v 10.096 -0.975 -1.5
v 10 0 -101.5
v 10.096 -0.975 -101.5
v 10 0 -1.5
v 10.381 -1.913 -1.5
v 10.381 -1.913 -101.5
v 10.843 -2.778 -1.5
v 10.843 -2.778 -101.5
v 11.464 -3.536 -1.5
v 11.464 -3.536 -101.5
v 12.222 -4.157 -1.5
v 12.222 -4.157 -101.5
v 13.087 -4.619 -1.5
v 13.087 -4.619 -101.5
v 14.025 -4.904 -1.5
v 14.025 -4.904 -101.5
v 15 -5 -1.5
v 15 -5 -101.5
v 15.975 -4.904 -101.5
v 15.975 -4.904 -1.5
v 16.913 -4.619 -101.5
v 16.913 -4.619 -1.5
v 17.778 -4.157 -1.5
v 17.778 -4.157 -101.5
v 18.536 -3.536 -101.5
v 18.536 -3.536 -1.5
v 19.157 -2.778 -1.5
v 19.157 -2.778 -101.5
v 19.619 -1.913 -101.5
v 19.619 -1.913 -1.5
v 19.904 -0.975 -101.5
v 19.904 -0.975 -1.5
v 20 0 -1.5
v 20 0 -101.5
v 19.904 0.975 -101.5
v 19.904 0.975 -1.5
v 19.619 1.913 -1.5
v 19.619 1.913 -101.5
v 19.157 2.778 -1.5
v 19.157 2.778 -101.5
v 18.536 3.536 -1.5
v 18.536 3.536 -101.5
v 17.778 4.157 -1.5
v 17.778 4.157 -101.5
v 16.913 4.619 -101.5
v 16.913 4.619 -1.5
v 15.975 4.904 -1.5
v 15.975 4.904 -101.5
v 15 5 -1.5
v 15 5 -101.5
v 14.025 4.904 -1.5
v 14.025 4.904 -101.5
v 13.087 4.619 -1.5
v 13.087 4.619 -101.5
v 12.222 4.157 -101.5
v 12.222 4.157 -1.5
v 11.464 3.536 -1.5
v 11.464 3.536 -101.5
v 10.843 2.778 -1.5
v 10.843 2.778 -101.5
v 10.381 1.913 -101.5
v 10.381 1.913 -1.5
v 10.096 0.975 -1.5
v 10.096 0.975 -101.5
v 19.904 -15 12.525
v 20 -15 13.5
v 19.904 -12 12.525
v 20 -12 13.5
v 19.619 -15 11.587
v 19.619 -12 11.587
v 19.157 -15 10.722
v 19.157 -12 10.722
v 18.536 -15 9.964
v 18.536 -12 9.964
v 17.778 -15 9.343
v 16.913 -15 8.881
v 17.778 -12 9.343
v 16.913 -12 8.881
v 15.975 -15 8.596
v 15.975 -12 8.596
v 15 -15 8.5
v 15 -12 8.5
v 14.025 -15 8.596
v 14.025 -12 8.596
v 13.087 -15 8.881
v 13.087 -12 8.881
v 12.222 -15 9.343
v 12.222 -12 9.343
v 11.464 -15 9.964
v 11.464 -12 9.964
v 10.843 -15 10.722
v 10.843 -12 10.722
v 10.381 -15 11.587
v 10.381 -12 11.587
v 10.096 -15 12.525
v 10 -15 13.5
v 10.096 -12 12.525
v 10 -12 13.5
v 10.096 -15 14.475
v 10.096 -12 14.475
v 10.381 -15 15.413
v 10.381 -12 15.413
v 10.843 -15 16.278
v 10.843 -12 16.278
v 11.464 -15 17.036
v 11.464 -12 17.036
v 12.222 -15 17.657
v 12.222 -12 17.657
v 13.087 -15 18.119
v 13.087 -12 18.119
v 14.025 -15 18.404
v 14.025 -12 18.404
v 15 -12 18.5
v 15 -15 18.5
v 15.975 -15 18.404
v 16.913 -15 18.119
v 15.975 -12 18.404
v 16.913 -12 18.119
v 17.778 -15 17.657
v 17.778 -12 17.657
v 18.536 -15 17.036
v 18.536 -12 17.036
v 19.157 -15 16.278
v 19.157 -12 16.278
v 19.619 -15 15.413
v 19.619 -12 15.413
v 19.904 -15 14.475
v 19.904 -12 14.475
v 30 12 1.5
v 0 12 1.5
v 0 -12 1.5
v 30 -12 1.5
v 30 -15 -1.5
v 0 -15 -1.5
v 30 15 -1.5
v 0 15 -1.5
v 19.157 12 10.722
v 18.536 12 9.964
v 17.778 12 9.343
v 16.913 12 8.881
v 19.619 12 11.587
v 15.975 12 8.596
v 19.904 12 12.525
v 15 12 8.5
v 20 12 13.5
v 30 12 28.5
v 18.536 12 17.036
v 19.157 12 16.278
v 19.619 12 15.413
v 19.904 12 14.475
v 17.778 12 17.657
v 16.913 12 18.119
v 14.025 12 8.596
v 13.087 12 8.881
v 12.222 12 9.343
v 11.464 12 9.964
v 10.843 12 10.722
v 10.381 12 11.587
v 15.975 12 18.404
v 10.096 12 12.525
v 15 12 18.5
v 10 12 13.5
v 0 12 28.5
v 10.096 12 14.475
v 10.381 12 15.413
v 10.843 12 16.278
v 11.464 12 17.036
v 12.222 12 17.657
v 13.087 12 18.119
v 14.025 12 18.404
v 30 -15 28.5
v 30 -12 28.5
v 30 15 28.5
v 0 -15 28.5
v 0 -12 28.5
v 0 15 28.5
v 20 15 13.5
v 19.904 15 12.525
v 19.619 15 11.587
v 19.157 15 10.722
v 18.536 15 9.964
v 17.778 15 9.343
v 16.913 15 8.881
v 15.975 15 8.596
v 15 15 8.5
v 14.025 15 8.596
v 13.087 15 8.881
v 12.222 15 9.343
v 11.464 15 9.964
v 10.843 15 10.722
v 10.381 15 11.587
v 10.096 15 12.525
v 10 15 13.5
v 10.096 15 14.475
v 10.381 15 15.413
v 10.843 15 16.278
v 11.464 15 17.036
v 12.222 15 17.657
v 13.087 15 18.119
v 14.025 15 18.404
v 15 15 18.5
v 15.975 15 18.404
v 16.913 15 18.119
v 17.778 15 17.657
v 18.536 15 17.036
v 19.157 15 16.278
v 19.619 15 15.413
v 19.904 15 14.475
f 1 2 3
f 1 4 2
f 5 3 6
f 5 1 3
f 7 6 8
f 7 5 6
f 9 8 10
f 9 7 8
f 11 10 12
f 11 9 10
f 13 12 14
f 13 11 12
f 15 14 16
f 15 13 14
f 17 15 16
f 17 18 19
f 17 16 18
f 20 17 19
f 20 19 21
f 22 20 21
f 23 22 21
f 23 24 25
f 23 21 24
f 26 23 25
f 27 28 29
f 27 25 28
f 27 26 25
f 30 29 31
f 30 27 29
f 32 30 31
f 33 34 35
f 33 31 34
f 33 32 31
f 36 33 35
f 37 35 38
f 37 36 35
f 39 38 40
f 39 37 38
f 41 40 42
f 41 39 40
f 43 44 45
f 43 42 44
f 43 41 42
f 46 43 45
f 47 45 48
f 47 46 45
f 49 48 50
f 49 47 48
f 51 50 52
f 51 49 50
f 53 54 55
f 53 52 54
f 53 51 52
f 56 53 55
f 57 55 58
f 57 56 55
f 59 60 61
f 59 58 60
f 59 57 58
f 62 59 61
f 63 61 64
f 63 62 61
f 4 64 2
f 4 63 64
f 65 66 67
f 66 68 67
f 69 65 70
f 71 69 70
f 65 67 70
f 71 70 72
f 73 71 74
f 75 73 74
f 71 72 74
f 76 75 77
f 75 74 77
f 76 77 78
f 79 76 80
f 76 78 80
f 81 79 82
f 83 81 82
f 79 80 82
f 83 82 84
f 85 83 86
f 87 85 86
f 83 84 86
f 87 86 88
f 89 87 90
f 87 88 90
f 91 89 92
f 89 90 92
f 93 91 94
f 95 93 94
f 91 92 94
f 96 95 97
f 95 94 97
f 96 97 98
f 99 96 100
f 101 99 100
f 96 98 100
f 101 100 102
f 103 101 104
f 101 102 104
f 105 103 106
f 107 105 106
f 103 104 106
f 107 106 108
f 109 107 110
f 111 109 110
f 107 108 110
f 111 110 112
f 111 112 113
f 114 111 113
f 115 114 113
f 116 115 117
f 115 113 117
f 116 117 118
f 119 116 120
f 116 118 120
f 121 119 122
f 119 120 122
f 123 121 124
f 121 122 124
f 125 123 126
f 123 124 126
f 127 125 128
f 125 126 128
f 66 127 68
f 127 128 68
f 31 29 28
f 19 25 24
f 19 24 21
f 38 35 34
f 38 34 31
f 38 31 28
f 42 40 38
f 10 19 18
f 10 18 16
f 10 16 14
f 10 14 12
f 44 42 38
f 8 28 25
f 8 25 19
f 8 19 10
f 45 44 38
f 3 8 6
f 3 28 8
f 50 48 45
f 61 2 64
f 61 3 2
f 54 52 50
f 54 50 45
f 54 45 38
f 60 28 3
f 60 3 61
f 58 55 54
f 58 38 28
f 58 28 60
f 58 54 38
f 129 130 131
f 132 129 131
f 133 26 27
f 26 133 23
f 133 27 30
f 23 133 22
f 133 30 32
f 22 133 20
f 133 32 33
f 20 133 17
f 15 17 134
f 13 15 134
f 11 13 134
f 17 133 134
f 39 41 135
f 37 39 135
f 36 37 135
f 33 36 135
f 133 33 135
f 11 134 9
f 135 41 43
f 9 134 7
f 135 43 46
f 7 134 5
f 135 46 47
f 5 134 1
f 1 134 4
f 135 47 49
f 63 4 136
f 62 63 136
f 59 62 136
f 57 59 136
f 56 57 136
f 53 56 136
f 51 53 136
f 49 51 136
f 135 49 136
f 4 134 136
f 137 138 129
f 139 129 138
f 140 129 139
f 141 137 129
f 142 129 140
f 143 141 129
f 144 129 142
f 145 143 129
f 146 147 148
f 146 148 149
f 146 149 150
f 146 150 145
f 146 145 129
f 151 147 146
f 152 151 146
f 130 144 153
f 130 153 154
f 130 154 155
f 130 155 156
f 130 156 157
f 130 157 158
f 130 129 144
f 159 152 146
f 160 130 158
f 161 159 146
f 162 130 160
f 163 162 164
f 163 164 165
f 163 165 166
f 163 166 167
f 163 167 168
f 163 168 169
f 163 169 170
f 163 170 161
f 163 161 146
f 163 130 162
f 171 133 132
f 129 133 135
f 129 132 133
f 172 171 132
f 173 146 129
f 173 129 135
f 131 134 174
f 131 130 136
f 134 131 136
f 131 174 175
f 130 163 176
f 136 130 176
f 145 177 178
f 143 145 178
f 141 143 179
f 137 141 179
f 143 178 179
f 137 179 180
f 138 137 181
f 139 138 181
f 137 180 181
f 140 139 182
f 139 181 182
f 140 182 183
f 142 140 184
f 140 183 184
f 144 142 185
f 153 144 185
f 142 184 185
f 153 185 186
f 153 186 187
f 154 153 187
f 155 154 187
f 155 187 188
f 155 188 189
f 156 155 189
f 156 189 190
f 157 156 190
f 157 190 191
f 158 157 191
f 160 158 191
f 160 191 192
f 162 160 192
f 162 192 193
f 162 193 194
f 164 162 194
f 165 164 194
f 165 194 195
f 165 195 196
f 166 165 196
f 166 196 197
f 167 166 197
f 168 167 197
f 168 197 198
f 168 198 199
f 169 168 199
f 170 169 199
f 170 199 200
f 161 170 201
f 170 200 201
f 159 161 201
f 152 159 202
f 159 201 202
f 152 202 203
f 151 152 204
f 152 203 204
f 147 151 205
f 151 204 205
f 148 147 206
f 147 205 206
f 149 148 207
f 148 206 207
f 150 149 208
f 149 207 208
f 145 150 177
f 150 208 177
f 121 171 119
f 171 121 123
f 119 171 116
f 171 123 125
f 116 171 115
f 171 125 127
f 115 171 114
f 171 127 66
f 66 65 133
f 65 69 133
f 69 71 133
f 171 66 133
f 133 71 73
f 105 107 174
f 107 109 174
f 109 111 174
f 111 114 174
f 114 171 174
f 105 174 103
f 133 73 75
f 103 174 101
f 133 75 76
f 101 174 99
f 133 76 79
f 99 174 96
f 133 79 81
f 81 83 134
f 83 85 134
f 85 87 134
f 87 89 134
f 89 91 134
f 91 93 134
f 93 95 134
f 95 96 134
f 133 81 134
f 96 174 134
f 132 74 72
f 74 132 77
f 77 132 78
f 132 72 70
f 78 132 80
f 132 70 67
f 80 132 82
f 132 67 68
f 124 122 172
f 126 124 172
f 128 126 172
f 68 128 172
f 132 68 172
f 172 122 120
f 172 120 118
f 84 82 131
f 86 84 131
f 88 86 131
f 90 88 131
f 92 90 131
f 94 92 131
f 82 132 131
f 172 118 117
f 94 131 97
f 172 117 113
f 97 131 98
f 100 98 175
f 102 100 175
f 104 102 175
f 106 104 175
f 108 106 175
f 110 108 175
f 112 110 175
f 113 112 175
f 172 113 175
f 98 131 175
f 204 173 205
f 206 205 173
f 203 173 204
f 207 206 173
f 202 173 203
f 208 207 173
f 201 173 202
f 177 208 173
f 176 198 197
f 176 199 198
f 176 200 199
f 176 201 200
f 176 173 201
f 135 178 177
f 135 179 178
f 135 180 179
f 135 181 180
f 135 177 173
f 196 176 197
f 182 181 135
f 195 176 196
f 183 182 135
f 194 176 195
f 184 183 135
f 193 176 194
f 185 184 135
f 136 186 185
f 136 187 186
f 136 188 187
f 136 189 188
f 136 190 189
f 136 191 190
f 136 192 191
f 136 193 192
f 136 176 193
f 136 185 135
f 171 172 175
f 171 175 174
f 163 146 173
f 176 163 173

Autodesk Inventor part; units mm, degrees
ref_plane "YZ Plane" through (0, 0, 0) normal (1, 0, 0) x (0, 1, 0)
ref_plane "XZ Plane" through (0, 0, 0) normal (0, 1, 0) x (-1, 0, 0)
ref_plane "XY Plane" through (0, 0, 0) normal (0, 0, 1) x (1, 0, 0)
sketch "Sketch1" plane through (0, 0, 0) normal (1, 0, 0) x (0, 1, 0)
  line L0 (12, 1.5) -> (-12, 1.5)
  line L1 (-15, 1.5) -> (-15, -1.5)
  line L2 (-15, -1.5) -> (15, -1.5)
  line L3 (15, -1.5) -> (15, 1.5)
  line L4 (15, 1.5) -> (-15, -1.5) construction
  line L5 (-15, 1.5) -> (15, -1.5) construction
  line L6 (15, -1.5) -> (12, -1.5)
  line L7 (12, 28.5) -> (15, 28.5)
  line L8 (15, 28.5) -> (15, -1.5)
  line L9 (-15, -1.5) -> (-12, -1.5)
  line L10 (-12, 28.5) -> (-15, 28.5)
  line L11 (-15, 28.5) -> (-15, -1.5)
  line L12 (12, -1.5) -> (12, -1.2)
  line L13 (12, 1.2) -> (12, 28.5)
  line L14 (-12, -1.5) -> (-12, -1.2)
  line L15 (-12, 1.2) -> (-12, 28.5)
  point P0 (0, 0)
  dimension "d0" = 30
  dimension "d1" = 3
  dimension "d2" = 3
  dimension "d3" = 30
  dimension "d4" = 3
  dimension "d5" = 30
extrude "Extrusion1" add sketch "Sketch1" along normal blind 30
sketch "Sketch2" plane through (0, 15, 28.5) normal (0, 1, 0) x (1, 0, 0)
  line L0 (0, 30) -> (30, 30) construction
  line L1 (0, 0) -> (30, 30) construction
  circle A0 centre (15, 15) radius 5
  point P0 (0, 28.5)
  dimension "d8" = 10
extrude "Extrusion2" cut sketch "Sketch2" against normal blind 30
sketch "Sketch3" plane through (0, -15, -1.5) normal (0, 0, -1) x (-1, 0, 0)
  line L0 (0, 0) -> (-30, 0) construction
  line L1 (0, 30) -> (-30, 30) construction
  line L2 (-30, 0) -> (0, 30) construction
  circle A0 centre (-15, 15) radius 5
  point P0 (0, 15)
  dimension "d11" = 10
extrude "Extrusion3" add sketch "Sketch3" along normal blind 100
properties part number "Tensioner"
